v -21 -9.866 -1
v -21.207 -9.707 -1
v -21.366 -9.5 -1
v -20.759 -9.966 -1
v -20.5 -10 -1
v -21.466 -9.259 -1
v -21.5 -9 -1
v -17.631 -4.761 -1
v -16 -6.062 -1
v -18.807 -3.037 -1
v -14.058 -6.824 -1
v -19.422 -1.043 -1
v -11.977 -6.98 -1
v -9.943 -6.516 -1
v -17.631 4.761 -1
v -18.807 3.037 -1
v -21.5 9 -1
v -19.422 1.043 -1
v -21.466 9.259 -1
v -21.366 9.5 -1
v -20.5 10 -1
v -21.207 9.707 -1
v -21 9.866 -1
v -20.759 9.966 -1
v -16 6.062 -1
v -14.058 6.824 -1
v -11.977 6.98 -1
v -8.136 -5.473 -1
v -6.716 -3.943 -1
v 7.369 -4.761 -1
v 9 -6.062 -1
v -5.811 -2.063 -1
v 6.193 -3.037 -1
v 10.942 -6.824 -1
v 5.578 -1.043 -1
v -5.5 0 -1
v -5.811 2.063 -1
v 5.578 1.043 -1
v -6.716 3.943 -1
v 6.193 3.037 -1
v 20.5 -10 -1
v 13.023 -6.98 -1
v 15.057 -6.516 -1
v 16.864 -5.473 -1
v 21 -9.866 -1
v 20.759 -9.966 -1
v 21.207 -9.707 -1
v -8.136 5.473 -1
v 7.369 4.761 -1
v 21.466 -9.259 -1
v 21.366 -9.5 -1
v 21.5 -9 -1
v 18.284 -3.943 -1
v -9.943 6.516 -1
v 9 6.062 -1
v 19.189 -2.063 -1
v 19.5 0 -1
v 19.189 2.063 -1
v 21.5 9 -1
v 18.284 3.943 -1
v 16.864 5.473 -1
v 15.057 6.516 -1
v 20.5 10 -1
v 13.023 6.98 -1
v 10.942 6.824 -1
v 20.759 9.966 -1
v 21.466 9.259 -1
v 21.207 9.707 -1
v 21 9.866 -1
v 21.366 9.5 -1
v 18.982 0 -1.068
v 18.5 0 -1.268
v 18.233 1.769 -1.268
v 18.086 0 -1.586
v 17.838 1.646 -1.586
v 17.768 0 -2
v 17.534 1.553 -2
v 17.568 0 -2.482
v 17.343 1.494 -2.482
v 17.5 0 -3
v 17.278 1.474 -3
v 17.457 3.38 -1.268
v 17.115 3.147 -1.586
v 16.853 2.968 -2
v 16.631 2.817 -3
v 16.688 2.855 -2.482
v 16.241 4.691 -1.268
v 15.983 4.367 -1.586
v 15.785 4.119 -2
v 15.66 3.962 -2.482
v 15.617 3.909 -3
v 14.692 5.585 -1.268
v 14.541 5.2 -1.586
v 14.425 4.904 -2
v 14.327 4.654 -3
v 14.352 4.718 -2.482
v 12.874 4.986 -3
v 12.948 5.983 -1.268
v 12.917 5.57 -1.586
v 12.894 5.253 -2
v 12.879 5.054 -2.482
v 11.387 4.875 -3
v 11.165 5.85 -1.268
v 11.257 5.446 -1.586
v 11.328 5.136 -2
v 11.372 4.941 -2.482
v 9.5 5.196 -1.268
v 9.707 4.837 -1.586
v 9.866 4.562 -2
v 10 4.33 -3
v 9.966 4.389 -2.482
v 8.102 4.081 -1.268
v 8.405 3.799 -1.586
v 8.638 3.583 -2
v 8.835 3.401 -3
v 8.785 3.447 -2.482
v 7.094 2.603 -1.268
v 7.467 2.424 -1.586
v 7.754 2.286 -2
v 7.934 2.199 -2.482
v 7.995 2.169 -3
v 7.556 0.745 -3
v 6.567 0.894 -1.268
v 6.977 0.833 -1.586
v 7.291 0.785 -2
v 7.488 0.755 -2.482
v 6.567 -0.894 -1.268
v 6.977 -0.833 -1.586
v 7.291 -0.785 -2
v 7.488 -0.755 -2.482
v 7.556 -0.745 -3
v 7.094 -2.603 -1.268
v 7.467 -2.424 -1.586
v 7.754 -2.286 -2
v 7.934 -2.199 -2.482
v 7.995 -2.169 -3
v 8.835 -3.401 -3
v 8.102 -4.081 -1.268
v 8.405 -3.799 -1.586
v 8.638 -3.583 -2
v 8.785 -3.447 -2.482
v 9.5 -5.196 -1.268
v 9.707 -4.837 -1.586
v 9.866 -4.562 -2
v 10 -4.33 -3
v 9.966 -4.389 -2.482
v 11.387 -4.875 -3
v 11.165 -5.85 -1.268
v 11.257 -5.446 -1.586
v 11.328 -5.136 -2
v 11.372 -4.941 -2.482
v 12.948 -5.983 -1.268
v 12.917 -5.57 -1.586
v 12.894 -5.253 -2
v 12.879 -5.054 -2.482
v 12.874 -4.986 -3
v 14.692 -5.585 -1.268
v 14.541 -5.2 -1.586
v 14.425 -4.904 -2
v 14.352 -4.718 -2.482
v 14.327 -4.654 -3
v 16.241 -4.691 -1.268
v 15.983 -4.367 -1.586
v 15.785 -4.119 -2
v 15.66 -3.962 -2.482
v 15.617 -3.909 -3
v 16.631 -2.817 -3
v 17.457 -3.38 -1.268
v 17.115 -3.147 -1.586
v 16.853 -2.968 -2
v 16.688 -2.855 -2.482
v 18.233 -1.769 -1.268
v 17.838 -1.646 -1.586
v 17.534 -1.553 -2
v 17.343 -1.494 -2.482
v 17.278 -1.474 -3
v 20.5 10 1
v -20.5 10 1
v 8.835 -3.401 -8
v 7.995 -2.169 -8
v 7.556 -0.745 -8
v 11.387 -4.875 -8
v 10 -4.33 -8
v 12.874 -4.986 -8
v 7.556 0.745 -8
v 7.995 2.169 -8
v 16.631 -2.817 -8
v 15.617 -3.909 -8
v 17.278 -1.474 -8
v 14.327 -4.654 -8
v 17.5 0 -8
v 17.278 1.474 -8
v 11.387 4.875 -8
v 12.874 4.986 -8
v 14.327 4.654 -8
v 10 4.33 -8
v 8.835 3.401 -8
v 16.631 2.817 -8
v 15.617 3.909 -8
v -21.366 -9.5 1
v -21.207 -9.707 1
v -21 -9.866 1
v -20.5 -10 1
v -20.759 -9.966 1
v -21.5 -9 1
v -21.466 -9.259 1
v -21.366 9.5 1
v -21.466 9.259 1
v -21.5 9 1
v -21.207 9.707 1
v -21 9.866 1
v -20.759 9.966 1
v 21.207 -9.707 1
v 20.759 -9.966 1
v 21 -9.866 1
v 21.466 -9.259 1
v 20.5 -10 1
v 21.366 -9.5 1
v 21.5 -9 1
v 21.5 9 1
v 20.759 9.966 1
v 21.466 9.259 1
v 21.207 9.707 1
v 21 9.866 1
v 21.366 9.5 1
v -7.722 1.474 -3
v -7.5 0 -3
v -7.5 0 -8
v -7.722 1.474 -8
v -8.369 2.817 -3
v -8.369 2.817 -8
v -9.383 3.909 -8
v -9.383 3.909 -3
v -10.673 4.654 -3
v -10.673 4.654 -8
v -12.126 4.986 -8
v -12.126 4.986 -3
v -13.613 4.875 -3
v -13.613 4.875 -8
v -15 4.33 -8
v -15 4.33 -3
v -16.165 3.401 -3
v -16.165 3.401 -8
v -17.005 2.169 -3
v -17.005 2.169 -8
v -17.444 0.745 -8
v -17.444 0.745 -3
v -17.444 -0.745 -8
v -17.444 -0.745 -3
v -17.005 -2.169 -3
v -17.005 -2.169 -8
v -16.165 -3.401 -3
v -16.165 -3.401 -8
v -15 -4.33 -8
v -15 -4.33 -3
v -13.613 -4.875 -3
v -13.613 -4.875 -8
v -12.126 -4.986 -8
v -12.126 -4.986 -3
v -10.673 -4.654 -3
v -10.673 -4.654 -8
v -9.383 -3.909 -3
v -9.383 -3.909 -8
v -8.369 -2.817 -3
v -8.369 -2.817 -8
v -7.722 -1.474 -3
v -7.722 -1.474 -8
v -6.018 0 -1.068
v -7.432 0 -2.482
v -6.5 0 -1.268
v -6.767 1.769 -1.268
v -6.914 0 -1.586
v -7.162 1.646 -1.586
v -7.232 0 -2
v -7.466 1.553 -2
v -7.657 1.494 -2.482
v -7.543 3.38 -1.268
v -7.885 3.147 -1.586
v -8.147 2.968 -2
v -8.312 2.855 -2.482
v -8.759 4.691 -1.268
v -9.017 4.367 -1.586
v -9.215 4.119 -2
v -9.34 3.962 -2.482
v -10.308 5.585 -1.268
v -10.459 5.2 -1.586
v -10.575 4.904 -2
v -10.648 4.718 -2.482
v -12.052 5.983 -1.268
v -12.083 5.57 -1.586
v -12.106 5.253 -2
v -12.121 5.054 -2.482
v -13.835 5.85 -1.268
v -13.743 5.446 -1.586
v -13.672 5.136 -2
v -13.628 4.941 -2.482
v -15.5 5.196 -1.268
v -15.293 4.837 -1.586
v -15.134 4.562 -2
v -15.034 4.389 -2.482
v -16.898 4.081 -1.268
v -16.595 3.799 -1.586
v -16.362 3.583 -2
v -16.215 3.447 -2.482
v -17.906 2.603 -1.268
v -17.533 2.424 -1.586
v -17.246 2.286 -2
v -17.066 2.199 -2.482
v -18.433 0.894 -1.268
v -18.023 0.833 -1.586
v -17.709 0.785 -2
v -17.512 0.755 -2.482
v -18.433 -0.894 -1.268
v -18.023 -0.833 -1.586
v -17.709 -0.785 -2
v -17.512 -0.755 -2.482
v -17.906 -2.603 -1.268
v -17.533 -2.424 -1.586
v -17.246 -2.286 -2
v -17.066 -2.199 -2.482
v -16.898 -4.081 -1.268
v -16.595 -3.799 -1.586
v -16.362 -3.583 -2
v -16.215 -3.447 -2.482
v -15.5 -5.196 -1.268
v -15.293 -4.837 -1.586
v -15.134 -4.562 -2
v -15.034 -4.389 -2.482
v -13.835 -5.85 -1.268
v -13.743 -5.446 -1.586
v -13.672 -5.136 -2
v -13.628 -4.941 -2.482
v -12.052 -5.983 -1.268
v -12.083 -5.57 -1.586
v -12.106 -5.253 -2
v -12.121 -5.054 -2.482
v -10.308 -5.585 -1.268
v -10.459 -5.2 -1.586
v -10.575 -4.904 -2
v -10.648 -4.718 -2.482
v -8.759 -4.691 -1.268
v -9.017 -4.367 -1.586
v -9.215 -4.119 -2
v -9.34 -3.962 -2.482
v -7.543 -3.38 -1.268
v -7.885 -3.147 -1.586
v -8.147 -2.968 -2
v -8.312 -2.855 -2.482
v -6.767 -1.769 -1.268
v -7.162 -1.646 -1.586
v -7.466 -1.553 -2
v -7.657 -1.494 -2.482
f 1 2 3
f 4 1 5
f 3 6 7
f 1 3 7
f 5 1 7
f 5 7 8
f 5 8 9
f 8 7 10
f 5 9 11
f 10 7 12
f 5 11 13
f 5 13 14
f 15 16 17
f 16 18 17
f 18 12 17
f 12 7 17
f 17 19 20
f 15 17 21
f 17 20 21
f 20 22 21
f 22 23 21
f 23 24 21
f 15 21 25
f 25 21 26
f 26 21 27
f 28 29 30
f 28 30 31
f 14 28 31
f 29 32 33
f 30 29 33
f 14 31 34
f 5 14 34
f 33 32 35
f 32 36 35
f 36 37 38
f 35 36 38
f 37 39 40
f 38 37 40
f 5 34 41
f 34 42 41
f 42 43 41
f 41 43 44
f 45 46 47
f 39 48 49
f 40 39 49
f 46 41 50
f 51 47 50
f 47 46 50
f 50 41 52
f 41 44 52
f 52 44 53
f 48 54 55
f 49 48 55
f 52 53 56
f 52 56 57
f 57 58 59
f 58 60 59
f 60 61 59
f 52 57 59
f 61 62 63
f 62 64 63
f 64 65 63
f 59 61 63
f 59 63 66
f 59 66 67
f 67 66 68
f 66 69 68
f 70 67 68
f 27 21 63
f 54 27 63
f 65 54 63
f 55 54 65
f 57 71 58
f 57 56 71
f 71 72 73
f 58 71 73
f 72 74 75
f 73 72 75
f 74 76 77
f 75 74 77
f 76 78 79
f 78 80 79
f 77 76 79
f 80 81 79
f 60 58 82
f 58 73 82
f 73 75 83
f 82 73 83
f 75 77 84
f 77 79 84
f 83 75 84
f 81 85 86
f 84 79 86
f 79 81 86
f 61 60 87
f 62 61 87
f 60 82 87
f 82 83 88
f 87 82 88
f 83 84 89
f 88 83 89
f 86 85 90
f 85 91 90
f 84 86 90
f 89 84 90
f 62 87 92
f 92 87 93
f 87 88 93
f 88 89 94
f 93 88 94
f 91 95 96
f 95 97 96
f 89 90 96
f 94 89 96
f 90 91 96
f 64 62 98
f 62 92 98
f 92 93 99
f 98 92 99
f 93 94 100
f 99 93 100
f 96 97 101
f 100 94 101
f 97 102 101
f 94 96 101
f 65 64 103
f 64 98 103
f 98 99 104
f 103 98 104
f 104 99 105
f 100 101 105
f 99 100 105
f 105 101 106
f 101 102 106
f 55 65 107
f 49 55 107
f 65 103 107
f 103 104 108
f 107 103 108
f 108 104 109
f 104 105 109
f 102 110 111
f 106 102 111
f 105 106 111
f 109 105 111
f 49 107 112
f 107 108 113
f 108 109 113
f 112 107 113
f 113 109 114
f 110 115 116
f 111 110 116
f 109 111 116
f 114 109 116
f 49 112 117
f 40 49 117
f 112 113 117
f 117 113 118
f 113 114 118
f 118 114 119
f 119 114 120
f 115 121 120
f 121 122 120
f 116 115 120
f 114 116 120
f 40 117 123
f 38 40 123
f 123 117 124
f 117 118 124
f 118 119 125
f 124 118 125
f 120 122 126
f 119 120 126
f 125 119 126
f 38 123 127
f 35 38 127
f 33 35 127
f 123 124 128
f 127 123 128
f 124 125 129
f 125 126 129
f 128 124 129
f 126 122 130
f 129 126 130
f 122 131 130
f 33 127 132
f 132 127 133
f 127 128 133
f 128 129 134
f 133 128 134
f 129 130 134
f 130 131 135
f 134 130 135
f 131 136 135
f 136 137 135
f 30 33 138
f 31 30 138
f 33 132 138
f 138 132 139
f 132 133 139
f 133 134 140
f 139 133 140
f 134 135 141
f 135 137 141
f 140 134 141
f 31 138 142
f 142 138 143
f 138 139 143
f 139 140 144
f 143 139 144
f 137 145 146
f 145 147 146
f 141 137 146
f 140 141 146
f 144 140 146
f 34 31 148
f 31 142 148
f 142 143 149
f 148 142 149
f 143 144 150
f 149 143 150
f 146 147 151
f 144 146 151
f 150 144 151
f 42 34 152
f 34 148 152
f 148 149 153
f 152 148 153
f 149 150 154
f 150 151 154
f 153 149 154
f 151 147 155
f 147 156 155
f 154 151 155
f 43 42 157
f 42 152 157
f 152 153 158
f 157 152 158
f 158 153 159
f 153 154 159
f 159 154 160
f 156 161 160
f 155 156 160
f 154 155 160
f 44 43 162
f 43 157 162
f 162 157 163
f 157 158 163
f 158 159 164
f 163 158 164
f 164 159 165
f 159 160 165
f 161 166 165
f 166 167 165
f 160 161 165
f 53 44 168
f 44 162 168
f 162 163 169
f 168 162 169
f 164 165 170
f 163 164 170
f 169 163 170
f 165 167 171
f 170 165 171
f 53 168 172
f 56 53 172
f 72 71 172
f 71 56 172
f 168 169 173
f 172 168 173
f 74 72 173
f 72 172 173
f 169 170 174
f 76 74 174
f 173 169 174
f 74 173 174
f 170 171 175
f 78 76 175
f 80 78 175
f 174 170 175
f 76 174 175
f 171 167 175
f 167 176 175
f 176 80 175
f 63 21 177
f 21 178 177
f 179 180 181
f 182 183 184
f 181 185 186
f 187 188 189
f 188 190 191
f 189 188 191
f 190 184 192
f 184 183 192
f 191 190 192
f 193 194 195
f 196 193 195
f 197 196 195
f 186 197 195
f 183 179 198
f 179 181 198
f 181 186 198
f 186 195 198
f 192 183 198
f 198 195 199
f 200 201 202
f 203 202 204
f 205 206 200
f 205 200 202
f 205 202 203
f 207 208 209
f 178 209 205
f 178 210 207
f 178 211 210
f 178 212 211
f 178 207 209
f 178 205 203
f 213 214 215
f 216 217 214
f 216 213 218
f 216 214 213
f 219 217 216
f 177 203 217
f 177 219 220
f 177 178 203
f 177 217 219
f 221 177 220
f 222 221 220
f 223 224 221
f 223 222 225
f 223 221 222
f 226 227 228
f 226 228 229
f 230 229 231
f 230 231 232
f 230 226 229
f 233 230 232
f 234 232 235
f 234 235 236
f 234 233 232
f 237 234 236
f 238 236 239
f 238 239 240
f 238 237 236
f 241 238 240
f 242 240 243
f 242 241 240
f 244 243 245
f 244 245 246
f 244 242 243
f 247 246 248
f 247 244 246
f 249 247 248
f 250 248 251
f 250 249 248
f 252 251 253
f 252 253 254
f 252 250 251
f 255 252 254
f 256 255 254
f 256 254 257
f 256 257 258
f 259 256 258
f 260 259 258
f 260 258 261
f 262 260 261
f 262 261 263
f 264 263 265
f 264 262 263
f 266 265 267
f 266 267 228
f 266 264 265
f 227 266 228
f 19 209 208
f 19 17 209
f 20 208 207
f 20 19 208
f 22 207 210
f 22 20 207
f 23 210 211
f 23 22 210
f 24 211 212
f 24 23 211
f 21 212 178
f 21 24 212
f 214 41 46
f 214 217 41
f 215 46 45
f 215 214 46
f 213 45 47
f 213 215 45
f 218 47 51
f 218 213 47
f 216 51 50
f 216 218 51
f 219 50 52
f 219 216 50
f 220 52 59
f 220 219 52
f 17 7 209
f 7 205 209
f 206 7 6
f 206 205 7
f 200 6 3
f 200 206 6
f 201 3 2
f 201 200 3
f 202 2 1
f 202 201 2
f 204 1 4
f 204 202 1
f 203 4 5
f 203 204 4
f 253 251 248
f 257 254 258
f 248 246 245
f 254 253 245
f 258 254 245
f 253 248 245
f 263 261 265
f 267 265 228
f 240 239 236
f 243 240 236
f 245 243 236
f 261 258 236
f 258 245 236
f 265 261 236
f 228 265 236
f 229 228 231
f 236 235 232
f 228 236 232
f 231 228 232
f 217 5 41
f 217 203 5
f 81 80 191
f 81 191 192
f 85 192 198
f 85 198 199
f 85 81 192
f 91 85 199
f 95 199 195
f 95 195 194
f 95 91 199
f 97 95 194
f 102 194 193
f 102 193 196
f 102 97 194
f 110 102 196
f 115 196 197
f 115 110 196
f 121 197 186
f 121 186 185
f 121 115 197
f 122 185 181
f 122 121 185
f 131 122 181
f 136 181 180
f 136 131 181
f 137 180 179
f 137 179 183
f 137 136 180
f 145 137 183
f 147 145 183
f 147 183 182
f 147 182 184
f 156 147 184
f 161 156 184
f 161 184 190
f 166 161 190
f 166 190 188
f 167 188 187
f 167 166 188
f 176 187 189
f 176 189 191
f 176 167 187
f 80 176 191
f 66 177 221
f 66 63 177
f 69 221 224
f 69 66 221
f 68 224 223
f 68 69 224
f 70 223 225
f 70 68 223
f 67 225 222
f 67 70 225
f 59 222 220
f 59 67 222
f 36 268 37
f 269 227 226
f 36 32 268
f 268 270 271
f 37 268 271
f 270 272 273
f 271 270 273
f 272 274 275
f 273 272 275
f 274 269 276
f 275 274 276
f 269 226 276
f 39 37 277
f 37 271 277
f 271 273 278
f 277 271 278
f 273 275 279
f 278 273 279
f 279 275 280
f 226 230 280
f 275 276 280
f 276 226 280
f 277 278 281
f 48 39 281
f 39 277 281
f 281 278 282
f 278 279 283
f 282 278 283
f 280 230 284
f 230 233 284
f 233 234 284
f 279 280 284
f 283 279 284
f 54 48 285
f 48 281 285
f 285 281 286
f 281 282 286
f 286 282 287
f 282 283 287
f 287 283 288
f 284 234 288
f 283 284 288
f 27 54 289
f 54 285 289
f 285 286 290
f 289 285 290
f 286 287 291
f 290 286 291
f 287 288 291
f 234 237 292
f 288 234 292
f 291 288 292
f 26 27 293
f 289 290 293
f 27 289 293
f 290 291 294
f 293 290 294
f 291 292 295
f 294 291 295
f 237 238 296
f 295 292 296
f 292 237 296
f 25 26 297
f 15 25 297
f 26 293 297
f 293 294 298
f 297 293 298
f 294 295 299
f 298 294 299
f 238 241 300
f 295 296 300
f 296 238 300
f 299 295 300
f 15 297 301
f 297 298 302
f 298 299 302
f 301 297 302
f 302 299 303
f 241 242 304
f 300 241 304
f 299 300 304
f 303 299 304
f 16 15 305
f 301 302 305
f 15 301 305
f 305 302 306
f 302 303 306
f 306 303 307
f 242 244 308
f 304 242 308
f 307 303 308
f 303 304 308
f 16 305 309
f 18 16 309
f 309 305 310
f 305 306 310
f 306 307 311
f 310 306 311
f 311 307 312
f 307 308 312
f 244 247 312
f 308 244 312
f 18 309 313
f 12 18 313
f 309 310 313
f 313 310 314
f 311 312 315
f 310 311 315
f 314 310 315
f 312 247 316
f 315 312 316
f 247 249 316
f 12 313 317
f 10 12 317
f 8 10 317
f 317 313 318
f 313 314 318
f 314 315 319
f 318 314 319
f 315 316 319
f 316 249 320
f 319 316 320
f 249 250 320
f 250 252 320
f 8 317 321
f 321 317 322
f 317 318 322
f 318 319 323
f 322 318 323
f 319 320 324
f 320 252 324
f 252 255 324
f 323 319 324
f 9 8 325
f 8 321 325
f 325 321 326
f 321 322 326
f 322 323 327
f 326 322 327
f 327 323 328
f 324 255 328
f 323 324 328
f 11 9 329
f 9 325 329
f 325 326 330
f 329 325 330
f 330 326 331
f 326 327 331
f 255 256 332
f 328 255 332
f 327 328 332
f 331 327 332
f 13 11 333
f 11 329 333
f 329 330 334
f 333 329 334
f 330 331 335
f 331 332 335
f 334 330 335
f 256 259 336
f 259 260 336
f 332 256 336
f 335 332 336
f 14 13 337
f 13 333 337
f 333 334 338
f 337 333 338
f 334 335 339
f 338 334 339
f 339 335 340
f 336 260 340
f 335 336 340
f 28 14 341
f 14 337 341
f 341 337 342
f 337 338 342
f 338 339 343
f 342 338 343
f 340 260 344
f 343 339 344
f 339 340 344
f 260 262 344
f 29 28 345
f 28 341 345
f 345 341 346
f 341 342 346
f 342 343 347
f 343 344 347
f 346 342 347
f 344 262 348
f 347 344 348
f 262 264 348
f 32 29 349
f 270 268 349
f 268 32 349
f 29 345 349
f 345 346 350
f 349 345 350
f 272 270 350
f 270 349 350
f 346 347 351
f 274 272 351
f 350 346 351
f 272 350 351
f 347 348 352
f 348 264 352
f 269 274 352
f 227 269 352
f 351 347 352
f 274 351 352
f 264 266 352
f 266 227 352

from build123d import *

# Parameters (mm, degrees)
SKETCH1_W           = 43
SKETCH1_H           = 20
BOSS_EXTRUDE1_DEPTH = 1
SKETCH2_R           = 5
BOSS_EXTRUDE2_DEPTH = 7
FILLET1_R           = 2
FILLET2_R           = 1


with BuildPart() as part:
    # Sketch1 → Boss-Extrude1 (new body, symmetric)
    with BuildSketch(Plane.XY):
        Rectangle(SKETCH1_W, SKETCH1_H)
    extrude(amount=BOSS_EXTRUDE1_DEPTH, both=True)

    # Sketch2 → Boss-Extrude2 (add)
    with BuildSketch(Plane.XY.offset(-1)):
        with Locations((-12.5, 0)):
            Circle(SKETCH2_R)
        with Locations((12.5, 0)):
            Circle(SKETCH2_R)
    extrude(amount=-BOSS_EXTRUDE2_DEPTH)

    # Fillet1
    fillet1_edges = [part.edges().sort_by_distance(p)[0] for p in [
        (-17.5, 0, -1),
        (7.5, 0, -1),
    ]]
    fillet(fillet1_edges, radius=FILLET1_R)

    # Fillet2
    fillet2_edges = [part.edges().sort_by_distance(p)[0] for p in [
        (21.5, -10, 0),
        (-21.5, -10, 0),
        (-21.5, 10, 0),
        (21.5, 10, 0),
    ]]
    fillet(fillet2_edges, radius=FILLET2_R)


solid = part.part
